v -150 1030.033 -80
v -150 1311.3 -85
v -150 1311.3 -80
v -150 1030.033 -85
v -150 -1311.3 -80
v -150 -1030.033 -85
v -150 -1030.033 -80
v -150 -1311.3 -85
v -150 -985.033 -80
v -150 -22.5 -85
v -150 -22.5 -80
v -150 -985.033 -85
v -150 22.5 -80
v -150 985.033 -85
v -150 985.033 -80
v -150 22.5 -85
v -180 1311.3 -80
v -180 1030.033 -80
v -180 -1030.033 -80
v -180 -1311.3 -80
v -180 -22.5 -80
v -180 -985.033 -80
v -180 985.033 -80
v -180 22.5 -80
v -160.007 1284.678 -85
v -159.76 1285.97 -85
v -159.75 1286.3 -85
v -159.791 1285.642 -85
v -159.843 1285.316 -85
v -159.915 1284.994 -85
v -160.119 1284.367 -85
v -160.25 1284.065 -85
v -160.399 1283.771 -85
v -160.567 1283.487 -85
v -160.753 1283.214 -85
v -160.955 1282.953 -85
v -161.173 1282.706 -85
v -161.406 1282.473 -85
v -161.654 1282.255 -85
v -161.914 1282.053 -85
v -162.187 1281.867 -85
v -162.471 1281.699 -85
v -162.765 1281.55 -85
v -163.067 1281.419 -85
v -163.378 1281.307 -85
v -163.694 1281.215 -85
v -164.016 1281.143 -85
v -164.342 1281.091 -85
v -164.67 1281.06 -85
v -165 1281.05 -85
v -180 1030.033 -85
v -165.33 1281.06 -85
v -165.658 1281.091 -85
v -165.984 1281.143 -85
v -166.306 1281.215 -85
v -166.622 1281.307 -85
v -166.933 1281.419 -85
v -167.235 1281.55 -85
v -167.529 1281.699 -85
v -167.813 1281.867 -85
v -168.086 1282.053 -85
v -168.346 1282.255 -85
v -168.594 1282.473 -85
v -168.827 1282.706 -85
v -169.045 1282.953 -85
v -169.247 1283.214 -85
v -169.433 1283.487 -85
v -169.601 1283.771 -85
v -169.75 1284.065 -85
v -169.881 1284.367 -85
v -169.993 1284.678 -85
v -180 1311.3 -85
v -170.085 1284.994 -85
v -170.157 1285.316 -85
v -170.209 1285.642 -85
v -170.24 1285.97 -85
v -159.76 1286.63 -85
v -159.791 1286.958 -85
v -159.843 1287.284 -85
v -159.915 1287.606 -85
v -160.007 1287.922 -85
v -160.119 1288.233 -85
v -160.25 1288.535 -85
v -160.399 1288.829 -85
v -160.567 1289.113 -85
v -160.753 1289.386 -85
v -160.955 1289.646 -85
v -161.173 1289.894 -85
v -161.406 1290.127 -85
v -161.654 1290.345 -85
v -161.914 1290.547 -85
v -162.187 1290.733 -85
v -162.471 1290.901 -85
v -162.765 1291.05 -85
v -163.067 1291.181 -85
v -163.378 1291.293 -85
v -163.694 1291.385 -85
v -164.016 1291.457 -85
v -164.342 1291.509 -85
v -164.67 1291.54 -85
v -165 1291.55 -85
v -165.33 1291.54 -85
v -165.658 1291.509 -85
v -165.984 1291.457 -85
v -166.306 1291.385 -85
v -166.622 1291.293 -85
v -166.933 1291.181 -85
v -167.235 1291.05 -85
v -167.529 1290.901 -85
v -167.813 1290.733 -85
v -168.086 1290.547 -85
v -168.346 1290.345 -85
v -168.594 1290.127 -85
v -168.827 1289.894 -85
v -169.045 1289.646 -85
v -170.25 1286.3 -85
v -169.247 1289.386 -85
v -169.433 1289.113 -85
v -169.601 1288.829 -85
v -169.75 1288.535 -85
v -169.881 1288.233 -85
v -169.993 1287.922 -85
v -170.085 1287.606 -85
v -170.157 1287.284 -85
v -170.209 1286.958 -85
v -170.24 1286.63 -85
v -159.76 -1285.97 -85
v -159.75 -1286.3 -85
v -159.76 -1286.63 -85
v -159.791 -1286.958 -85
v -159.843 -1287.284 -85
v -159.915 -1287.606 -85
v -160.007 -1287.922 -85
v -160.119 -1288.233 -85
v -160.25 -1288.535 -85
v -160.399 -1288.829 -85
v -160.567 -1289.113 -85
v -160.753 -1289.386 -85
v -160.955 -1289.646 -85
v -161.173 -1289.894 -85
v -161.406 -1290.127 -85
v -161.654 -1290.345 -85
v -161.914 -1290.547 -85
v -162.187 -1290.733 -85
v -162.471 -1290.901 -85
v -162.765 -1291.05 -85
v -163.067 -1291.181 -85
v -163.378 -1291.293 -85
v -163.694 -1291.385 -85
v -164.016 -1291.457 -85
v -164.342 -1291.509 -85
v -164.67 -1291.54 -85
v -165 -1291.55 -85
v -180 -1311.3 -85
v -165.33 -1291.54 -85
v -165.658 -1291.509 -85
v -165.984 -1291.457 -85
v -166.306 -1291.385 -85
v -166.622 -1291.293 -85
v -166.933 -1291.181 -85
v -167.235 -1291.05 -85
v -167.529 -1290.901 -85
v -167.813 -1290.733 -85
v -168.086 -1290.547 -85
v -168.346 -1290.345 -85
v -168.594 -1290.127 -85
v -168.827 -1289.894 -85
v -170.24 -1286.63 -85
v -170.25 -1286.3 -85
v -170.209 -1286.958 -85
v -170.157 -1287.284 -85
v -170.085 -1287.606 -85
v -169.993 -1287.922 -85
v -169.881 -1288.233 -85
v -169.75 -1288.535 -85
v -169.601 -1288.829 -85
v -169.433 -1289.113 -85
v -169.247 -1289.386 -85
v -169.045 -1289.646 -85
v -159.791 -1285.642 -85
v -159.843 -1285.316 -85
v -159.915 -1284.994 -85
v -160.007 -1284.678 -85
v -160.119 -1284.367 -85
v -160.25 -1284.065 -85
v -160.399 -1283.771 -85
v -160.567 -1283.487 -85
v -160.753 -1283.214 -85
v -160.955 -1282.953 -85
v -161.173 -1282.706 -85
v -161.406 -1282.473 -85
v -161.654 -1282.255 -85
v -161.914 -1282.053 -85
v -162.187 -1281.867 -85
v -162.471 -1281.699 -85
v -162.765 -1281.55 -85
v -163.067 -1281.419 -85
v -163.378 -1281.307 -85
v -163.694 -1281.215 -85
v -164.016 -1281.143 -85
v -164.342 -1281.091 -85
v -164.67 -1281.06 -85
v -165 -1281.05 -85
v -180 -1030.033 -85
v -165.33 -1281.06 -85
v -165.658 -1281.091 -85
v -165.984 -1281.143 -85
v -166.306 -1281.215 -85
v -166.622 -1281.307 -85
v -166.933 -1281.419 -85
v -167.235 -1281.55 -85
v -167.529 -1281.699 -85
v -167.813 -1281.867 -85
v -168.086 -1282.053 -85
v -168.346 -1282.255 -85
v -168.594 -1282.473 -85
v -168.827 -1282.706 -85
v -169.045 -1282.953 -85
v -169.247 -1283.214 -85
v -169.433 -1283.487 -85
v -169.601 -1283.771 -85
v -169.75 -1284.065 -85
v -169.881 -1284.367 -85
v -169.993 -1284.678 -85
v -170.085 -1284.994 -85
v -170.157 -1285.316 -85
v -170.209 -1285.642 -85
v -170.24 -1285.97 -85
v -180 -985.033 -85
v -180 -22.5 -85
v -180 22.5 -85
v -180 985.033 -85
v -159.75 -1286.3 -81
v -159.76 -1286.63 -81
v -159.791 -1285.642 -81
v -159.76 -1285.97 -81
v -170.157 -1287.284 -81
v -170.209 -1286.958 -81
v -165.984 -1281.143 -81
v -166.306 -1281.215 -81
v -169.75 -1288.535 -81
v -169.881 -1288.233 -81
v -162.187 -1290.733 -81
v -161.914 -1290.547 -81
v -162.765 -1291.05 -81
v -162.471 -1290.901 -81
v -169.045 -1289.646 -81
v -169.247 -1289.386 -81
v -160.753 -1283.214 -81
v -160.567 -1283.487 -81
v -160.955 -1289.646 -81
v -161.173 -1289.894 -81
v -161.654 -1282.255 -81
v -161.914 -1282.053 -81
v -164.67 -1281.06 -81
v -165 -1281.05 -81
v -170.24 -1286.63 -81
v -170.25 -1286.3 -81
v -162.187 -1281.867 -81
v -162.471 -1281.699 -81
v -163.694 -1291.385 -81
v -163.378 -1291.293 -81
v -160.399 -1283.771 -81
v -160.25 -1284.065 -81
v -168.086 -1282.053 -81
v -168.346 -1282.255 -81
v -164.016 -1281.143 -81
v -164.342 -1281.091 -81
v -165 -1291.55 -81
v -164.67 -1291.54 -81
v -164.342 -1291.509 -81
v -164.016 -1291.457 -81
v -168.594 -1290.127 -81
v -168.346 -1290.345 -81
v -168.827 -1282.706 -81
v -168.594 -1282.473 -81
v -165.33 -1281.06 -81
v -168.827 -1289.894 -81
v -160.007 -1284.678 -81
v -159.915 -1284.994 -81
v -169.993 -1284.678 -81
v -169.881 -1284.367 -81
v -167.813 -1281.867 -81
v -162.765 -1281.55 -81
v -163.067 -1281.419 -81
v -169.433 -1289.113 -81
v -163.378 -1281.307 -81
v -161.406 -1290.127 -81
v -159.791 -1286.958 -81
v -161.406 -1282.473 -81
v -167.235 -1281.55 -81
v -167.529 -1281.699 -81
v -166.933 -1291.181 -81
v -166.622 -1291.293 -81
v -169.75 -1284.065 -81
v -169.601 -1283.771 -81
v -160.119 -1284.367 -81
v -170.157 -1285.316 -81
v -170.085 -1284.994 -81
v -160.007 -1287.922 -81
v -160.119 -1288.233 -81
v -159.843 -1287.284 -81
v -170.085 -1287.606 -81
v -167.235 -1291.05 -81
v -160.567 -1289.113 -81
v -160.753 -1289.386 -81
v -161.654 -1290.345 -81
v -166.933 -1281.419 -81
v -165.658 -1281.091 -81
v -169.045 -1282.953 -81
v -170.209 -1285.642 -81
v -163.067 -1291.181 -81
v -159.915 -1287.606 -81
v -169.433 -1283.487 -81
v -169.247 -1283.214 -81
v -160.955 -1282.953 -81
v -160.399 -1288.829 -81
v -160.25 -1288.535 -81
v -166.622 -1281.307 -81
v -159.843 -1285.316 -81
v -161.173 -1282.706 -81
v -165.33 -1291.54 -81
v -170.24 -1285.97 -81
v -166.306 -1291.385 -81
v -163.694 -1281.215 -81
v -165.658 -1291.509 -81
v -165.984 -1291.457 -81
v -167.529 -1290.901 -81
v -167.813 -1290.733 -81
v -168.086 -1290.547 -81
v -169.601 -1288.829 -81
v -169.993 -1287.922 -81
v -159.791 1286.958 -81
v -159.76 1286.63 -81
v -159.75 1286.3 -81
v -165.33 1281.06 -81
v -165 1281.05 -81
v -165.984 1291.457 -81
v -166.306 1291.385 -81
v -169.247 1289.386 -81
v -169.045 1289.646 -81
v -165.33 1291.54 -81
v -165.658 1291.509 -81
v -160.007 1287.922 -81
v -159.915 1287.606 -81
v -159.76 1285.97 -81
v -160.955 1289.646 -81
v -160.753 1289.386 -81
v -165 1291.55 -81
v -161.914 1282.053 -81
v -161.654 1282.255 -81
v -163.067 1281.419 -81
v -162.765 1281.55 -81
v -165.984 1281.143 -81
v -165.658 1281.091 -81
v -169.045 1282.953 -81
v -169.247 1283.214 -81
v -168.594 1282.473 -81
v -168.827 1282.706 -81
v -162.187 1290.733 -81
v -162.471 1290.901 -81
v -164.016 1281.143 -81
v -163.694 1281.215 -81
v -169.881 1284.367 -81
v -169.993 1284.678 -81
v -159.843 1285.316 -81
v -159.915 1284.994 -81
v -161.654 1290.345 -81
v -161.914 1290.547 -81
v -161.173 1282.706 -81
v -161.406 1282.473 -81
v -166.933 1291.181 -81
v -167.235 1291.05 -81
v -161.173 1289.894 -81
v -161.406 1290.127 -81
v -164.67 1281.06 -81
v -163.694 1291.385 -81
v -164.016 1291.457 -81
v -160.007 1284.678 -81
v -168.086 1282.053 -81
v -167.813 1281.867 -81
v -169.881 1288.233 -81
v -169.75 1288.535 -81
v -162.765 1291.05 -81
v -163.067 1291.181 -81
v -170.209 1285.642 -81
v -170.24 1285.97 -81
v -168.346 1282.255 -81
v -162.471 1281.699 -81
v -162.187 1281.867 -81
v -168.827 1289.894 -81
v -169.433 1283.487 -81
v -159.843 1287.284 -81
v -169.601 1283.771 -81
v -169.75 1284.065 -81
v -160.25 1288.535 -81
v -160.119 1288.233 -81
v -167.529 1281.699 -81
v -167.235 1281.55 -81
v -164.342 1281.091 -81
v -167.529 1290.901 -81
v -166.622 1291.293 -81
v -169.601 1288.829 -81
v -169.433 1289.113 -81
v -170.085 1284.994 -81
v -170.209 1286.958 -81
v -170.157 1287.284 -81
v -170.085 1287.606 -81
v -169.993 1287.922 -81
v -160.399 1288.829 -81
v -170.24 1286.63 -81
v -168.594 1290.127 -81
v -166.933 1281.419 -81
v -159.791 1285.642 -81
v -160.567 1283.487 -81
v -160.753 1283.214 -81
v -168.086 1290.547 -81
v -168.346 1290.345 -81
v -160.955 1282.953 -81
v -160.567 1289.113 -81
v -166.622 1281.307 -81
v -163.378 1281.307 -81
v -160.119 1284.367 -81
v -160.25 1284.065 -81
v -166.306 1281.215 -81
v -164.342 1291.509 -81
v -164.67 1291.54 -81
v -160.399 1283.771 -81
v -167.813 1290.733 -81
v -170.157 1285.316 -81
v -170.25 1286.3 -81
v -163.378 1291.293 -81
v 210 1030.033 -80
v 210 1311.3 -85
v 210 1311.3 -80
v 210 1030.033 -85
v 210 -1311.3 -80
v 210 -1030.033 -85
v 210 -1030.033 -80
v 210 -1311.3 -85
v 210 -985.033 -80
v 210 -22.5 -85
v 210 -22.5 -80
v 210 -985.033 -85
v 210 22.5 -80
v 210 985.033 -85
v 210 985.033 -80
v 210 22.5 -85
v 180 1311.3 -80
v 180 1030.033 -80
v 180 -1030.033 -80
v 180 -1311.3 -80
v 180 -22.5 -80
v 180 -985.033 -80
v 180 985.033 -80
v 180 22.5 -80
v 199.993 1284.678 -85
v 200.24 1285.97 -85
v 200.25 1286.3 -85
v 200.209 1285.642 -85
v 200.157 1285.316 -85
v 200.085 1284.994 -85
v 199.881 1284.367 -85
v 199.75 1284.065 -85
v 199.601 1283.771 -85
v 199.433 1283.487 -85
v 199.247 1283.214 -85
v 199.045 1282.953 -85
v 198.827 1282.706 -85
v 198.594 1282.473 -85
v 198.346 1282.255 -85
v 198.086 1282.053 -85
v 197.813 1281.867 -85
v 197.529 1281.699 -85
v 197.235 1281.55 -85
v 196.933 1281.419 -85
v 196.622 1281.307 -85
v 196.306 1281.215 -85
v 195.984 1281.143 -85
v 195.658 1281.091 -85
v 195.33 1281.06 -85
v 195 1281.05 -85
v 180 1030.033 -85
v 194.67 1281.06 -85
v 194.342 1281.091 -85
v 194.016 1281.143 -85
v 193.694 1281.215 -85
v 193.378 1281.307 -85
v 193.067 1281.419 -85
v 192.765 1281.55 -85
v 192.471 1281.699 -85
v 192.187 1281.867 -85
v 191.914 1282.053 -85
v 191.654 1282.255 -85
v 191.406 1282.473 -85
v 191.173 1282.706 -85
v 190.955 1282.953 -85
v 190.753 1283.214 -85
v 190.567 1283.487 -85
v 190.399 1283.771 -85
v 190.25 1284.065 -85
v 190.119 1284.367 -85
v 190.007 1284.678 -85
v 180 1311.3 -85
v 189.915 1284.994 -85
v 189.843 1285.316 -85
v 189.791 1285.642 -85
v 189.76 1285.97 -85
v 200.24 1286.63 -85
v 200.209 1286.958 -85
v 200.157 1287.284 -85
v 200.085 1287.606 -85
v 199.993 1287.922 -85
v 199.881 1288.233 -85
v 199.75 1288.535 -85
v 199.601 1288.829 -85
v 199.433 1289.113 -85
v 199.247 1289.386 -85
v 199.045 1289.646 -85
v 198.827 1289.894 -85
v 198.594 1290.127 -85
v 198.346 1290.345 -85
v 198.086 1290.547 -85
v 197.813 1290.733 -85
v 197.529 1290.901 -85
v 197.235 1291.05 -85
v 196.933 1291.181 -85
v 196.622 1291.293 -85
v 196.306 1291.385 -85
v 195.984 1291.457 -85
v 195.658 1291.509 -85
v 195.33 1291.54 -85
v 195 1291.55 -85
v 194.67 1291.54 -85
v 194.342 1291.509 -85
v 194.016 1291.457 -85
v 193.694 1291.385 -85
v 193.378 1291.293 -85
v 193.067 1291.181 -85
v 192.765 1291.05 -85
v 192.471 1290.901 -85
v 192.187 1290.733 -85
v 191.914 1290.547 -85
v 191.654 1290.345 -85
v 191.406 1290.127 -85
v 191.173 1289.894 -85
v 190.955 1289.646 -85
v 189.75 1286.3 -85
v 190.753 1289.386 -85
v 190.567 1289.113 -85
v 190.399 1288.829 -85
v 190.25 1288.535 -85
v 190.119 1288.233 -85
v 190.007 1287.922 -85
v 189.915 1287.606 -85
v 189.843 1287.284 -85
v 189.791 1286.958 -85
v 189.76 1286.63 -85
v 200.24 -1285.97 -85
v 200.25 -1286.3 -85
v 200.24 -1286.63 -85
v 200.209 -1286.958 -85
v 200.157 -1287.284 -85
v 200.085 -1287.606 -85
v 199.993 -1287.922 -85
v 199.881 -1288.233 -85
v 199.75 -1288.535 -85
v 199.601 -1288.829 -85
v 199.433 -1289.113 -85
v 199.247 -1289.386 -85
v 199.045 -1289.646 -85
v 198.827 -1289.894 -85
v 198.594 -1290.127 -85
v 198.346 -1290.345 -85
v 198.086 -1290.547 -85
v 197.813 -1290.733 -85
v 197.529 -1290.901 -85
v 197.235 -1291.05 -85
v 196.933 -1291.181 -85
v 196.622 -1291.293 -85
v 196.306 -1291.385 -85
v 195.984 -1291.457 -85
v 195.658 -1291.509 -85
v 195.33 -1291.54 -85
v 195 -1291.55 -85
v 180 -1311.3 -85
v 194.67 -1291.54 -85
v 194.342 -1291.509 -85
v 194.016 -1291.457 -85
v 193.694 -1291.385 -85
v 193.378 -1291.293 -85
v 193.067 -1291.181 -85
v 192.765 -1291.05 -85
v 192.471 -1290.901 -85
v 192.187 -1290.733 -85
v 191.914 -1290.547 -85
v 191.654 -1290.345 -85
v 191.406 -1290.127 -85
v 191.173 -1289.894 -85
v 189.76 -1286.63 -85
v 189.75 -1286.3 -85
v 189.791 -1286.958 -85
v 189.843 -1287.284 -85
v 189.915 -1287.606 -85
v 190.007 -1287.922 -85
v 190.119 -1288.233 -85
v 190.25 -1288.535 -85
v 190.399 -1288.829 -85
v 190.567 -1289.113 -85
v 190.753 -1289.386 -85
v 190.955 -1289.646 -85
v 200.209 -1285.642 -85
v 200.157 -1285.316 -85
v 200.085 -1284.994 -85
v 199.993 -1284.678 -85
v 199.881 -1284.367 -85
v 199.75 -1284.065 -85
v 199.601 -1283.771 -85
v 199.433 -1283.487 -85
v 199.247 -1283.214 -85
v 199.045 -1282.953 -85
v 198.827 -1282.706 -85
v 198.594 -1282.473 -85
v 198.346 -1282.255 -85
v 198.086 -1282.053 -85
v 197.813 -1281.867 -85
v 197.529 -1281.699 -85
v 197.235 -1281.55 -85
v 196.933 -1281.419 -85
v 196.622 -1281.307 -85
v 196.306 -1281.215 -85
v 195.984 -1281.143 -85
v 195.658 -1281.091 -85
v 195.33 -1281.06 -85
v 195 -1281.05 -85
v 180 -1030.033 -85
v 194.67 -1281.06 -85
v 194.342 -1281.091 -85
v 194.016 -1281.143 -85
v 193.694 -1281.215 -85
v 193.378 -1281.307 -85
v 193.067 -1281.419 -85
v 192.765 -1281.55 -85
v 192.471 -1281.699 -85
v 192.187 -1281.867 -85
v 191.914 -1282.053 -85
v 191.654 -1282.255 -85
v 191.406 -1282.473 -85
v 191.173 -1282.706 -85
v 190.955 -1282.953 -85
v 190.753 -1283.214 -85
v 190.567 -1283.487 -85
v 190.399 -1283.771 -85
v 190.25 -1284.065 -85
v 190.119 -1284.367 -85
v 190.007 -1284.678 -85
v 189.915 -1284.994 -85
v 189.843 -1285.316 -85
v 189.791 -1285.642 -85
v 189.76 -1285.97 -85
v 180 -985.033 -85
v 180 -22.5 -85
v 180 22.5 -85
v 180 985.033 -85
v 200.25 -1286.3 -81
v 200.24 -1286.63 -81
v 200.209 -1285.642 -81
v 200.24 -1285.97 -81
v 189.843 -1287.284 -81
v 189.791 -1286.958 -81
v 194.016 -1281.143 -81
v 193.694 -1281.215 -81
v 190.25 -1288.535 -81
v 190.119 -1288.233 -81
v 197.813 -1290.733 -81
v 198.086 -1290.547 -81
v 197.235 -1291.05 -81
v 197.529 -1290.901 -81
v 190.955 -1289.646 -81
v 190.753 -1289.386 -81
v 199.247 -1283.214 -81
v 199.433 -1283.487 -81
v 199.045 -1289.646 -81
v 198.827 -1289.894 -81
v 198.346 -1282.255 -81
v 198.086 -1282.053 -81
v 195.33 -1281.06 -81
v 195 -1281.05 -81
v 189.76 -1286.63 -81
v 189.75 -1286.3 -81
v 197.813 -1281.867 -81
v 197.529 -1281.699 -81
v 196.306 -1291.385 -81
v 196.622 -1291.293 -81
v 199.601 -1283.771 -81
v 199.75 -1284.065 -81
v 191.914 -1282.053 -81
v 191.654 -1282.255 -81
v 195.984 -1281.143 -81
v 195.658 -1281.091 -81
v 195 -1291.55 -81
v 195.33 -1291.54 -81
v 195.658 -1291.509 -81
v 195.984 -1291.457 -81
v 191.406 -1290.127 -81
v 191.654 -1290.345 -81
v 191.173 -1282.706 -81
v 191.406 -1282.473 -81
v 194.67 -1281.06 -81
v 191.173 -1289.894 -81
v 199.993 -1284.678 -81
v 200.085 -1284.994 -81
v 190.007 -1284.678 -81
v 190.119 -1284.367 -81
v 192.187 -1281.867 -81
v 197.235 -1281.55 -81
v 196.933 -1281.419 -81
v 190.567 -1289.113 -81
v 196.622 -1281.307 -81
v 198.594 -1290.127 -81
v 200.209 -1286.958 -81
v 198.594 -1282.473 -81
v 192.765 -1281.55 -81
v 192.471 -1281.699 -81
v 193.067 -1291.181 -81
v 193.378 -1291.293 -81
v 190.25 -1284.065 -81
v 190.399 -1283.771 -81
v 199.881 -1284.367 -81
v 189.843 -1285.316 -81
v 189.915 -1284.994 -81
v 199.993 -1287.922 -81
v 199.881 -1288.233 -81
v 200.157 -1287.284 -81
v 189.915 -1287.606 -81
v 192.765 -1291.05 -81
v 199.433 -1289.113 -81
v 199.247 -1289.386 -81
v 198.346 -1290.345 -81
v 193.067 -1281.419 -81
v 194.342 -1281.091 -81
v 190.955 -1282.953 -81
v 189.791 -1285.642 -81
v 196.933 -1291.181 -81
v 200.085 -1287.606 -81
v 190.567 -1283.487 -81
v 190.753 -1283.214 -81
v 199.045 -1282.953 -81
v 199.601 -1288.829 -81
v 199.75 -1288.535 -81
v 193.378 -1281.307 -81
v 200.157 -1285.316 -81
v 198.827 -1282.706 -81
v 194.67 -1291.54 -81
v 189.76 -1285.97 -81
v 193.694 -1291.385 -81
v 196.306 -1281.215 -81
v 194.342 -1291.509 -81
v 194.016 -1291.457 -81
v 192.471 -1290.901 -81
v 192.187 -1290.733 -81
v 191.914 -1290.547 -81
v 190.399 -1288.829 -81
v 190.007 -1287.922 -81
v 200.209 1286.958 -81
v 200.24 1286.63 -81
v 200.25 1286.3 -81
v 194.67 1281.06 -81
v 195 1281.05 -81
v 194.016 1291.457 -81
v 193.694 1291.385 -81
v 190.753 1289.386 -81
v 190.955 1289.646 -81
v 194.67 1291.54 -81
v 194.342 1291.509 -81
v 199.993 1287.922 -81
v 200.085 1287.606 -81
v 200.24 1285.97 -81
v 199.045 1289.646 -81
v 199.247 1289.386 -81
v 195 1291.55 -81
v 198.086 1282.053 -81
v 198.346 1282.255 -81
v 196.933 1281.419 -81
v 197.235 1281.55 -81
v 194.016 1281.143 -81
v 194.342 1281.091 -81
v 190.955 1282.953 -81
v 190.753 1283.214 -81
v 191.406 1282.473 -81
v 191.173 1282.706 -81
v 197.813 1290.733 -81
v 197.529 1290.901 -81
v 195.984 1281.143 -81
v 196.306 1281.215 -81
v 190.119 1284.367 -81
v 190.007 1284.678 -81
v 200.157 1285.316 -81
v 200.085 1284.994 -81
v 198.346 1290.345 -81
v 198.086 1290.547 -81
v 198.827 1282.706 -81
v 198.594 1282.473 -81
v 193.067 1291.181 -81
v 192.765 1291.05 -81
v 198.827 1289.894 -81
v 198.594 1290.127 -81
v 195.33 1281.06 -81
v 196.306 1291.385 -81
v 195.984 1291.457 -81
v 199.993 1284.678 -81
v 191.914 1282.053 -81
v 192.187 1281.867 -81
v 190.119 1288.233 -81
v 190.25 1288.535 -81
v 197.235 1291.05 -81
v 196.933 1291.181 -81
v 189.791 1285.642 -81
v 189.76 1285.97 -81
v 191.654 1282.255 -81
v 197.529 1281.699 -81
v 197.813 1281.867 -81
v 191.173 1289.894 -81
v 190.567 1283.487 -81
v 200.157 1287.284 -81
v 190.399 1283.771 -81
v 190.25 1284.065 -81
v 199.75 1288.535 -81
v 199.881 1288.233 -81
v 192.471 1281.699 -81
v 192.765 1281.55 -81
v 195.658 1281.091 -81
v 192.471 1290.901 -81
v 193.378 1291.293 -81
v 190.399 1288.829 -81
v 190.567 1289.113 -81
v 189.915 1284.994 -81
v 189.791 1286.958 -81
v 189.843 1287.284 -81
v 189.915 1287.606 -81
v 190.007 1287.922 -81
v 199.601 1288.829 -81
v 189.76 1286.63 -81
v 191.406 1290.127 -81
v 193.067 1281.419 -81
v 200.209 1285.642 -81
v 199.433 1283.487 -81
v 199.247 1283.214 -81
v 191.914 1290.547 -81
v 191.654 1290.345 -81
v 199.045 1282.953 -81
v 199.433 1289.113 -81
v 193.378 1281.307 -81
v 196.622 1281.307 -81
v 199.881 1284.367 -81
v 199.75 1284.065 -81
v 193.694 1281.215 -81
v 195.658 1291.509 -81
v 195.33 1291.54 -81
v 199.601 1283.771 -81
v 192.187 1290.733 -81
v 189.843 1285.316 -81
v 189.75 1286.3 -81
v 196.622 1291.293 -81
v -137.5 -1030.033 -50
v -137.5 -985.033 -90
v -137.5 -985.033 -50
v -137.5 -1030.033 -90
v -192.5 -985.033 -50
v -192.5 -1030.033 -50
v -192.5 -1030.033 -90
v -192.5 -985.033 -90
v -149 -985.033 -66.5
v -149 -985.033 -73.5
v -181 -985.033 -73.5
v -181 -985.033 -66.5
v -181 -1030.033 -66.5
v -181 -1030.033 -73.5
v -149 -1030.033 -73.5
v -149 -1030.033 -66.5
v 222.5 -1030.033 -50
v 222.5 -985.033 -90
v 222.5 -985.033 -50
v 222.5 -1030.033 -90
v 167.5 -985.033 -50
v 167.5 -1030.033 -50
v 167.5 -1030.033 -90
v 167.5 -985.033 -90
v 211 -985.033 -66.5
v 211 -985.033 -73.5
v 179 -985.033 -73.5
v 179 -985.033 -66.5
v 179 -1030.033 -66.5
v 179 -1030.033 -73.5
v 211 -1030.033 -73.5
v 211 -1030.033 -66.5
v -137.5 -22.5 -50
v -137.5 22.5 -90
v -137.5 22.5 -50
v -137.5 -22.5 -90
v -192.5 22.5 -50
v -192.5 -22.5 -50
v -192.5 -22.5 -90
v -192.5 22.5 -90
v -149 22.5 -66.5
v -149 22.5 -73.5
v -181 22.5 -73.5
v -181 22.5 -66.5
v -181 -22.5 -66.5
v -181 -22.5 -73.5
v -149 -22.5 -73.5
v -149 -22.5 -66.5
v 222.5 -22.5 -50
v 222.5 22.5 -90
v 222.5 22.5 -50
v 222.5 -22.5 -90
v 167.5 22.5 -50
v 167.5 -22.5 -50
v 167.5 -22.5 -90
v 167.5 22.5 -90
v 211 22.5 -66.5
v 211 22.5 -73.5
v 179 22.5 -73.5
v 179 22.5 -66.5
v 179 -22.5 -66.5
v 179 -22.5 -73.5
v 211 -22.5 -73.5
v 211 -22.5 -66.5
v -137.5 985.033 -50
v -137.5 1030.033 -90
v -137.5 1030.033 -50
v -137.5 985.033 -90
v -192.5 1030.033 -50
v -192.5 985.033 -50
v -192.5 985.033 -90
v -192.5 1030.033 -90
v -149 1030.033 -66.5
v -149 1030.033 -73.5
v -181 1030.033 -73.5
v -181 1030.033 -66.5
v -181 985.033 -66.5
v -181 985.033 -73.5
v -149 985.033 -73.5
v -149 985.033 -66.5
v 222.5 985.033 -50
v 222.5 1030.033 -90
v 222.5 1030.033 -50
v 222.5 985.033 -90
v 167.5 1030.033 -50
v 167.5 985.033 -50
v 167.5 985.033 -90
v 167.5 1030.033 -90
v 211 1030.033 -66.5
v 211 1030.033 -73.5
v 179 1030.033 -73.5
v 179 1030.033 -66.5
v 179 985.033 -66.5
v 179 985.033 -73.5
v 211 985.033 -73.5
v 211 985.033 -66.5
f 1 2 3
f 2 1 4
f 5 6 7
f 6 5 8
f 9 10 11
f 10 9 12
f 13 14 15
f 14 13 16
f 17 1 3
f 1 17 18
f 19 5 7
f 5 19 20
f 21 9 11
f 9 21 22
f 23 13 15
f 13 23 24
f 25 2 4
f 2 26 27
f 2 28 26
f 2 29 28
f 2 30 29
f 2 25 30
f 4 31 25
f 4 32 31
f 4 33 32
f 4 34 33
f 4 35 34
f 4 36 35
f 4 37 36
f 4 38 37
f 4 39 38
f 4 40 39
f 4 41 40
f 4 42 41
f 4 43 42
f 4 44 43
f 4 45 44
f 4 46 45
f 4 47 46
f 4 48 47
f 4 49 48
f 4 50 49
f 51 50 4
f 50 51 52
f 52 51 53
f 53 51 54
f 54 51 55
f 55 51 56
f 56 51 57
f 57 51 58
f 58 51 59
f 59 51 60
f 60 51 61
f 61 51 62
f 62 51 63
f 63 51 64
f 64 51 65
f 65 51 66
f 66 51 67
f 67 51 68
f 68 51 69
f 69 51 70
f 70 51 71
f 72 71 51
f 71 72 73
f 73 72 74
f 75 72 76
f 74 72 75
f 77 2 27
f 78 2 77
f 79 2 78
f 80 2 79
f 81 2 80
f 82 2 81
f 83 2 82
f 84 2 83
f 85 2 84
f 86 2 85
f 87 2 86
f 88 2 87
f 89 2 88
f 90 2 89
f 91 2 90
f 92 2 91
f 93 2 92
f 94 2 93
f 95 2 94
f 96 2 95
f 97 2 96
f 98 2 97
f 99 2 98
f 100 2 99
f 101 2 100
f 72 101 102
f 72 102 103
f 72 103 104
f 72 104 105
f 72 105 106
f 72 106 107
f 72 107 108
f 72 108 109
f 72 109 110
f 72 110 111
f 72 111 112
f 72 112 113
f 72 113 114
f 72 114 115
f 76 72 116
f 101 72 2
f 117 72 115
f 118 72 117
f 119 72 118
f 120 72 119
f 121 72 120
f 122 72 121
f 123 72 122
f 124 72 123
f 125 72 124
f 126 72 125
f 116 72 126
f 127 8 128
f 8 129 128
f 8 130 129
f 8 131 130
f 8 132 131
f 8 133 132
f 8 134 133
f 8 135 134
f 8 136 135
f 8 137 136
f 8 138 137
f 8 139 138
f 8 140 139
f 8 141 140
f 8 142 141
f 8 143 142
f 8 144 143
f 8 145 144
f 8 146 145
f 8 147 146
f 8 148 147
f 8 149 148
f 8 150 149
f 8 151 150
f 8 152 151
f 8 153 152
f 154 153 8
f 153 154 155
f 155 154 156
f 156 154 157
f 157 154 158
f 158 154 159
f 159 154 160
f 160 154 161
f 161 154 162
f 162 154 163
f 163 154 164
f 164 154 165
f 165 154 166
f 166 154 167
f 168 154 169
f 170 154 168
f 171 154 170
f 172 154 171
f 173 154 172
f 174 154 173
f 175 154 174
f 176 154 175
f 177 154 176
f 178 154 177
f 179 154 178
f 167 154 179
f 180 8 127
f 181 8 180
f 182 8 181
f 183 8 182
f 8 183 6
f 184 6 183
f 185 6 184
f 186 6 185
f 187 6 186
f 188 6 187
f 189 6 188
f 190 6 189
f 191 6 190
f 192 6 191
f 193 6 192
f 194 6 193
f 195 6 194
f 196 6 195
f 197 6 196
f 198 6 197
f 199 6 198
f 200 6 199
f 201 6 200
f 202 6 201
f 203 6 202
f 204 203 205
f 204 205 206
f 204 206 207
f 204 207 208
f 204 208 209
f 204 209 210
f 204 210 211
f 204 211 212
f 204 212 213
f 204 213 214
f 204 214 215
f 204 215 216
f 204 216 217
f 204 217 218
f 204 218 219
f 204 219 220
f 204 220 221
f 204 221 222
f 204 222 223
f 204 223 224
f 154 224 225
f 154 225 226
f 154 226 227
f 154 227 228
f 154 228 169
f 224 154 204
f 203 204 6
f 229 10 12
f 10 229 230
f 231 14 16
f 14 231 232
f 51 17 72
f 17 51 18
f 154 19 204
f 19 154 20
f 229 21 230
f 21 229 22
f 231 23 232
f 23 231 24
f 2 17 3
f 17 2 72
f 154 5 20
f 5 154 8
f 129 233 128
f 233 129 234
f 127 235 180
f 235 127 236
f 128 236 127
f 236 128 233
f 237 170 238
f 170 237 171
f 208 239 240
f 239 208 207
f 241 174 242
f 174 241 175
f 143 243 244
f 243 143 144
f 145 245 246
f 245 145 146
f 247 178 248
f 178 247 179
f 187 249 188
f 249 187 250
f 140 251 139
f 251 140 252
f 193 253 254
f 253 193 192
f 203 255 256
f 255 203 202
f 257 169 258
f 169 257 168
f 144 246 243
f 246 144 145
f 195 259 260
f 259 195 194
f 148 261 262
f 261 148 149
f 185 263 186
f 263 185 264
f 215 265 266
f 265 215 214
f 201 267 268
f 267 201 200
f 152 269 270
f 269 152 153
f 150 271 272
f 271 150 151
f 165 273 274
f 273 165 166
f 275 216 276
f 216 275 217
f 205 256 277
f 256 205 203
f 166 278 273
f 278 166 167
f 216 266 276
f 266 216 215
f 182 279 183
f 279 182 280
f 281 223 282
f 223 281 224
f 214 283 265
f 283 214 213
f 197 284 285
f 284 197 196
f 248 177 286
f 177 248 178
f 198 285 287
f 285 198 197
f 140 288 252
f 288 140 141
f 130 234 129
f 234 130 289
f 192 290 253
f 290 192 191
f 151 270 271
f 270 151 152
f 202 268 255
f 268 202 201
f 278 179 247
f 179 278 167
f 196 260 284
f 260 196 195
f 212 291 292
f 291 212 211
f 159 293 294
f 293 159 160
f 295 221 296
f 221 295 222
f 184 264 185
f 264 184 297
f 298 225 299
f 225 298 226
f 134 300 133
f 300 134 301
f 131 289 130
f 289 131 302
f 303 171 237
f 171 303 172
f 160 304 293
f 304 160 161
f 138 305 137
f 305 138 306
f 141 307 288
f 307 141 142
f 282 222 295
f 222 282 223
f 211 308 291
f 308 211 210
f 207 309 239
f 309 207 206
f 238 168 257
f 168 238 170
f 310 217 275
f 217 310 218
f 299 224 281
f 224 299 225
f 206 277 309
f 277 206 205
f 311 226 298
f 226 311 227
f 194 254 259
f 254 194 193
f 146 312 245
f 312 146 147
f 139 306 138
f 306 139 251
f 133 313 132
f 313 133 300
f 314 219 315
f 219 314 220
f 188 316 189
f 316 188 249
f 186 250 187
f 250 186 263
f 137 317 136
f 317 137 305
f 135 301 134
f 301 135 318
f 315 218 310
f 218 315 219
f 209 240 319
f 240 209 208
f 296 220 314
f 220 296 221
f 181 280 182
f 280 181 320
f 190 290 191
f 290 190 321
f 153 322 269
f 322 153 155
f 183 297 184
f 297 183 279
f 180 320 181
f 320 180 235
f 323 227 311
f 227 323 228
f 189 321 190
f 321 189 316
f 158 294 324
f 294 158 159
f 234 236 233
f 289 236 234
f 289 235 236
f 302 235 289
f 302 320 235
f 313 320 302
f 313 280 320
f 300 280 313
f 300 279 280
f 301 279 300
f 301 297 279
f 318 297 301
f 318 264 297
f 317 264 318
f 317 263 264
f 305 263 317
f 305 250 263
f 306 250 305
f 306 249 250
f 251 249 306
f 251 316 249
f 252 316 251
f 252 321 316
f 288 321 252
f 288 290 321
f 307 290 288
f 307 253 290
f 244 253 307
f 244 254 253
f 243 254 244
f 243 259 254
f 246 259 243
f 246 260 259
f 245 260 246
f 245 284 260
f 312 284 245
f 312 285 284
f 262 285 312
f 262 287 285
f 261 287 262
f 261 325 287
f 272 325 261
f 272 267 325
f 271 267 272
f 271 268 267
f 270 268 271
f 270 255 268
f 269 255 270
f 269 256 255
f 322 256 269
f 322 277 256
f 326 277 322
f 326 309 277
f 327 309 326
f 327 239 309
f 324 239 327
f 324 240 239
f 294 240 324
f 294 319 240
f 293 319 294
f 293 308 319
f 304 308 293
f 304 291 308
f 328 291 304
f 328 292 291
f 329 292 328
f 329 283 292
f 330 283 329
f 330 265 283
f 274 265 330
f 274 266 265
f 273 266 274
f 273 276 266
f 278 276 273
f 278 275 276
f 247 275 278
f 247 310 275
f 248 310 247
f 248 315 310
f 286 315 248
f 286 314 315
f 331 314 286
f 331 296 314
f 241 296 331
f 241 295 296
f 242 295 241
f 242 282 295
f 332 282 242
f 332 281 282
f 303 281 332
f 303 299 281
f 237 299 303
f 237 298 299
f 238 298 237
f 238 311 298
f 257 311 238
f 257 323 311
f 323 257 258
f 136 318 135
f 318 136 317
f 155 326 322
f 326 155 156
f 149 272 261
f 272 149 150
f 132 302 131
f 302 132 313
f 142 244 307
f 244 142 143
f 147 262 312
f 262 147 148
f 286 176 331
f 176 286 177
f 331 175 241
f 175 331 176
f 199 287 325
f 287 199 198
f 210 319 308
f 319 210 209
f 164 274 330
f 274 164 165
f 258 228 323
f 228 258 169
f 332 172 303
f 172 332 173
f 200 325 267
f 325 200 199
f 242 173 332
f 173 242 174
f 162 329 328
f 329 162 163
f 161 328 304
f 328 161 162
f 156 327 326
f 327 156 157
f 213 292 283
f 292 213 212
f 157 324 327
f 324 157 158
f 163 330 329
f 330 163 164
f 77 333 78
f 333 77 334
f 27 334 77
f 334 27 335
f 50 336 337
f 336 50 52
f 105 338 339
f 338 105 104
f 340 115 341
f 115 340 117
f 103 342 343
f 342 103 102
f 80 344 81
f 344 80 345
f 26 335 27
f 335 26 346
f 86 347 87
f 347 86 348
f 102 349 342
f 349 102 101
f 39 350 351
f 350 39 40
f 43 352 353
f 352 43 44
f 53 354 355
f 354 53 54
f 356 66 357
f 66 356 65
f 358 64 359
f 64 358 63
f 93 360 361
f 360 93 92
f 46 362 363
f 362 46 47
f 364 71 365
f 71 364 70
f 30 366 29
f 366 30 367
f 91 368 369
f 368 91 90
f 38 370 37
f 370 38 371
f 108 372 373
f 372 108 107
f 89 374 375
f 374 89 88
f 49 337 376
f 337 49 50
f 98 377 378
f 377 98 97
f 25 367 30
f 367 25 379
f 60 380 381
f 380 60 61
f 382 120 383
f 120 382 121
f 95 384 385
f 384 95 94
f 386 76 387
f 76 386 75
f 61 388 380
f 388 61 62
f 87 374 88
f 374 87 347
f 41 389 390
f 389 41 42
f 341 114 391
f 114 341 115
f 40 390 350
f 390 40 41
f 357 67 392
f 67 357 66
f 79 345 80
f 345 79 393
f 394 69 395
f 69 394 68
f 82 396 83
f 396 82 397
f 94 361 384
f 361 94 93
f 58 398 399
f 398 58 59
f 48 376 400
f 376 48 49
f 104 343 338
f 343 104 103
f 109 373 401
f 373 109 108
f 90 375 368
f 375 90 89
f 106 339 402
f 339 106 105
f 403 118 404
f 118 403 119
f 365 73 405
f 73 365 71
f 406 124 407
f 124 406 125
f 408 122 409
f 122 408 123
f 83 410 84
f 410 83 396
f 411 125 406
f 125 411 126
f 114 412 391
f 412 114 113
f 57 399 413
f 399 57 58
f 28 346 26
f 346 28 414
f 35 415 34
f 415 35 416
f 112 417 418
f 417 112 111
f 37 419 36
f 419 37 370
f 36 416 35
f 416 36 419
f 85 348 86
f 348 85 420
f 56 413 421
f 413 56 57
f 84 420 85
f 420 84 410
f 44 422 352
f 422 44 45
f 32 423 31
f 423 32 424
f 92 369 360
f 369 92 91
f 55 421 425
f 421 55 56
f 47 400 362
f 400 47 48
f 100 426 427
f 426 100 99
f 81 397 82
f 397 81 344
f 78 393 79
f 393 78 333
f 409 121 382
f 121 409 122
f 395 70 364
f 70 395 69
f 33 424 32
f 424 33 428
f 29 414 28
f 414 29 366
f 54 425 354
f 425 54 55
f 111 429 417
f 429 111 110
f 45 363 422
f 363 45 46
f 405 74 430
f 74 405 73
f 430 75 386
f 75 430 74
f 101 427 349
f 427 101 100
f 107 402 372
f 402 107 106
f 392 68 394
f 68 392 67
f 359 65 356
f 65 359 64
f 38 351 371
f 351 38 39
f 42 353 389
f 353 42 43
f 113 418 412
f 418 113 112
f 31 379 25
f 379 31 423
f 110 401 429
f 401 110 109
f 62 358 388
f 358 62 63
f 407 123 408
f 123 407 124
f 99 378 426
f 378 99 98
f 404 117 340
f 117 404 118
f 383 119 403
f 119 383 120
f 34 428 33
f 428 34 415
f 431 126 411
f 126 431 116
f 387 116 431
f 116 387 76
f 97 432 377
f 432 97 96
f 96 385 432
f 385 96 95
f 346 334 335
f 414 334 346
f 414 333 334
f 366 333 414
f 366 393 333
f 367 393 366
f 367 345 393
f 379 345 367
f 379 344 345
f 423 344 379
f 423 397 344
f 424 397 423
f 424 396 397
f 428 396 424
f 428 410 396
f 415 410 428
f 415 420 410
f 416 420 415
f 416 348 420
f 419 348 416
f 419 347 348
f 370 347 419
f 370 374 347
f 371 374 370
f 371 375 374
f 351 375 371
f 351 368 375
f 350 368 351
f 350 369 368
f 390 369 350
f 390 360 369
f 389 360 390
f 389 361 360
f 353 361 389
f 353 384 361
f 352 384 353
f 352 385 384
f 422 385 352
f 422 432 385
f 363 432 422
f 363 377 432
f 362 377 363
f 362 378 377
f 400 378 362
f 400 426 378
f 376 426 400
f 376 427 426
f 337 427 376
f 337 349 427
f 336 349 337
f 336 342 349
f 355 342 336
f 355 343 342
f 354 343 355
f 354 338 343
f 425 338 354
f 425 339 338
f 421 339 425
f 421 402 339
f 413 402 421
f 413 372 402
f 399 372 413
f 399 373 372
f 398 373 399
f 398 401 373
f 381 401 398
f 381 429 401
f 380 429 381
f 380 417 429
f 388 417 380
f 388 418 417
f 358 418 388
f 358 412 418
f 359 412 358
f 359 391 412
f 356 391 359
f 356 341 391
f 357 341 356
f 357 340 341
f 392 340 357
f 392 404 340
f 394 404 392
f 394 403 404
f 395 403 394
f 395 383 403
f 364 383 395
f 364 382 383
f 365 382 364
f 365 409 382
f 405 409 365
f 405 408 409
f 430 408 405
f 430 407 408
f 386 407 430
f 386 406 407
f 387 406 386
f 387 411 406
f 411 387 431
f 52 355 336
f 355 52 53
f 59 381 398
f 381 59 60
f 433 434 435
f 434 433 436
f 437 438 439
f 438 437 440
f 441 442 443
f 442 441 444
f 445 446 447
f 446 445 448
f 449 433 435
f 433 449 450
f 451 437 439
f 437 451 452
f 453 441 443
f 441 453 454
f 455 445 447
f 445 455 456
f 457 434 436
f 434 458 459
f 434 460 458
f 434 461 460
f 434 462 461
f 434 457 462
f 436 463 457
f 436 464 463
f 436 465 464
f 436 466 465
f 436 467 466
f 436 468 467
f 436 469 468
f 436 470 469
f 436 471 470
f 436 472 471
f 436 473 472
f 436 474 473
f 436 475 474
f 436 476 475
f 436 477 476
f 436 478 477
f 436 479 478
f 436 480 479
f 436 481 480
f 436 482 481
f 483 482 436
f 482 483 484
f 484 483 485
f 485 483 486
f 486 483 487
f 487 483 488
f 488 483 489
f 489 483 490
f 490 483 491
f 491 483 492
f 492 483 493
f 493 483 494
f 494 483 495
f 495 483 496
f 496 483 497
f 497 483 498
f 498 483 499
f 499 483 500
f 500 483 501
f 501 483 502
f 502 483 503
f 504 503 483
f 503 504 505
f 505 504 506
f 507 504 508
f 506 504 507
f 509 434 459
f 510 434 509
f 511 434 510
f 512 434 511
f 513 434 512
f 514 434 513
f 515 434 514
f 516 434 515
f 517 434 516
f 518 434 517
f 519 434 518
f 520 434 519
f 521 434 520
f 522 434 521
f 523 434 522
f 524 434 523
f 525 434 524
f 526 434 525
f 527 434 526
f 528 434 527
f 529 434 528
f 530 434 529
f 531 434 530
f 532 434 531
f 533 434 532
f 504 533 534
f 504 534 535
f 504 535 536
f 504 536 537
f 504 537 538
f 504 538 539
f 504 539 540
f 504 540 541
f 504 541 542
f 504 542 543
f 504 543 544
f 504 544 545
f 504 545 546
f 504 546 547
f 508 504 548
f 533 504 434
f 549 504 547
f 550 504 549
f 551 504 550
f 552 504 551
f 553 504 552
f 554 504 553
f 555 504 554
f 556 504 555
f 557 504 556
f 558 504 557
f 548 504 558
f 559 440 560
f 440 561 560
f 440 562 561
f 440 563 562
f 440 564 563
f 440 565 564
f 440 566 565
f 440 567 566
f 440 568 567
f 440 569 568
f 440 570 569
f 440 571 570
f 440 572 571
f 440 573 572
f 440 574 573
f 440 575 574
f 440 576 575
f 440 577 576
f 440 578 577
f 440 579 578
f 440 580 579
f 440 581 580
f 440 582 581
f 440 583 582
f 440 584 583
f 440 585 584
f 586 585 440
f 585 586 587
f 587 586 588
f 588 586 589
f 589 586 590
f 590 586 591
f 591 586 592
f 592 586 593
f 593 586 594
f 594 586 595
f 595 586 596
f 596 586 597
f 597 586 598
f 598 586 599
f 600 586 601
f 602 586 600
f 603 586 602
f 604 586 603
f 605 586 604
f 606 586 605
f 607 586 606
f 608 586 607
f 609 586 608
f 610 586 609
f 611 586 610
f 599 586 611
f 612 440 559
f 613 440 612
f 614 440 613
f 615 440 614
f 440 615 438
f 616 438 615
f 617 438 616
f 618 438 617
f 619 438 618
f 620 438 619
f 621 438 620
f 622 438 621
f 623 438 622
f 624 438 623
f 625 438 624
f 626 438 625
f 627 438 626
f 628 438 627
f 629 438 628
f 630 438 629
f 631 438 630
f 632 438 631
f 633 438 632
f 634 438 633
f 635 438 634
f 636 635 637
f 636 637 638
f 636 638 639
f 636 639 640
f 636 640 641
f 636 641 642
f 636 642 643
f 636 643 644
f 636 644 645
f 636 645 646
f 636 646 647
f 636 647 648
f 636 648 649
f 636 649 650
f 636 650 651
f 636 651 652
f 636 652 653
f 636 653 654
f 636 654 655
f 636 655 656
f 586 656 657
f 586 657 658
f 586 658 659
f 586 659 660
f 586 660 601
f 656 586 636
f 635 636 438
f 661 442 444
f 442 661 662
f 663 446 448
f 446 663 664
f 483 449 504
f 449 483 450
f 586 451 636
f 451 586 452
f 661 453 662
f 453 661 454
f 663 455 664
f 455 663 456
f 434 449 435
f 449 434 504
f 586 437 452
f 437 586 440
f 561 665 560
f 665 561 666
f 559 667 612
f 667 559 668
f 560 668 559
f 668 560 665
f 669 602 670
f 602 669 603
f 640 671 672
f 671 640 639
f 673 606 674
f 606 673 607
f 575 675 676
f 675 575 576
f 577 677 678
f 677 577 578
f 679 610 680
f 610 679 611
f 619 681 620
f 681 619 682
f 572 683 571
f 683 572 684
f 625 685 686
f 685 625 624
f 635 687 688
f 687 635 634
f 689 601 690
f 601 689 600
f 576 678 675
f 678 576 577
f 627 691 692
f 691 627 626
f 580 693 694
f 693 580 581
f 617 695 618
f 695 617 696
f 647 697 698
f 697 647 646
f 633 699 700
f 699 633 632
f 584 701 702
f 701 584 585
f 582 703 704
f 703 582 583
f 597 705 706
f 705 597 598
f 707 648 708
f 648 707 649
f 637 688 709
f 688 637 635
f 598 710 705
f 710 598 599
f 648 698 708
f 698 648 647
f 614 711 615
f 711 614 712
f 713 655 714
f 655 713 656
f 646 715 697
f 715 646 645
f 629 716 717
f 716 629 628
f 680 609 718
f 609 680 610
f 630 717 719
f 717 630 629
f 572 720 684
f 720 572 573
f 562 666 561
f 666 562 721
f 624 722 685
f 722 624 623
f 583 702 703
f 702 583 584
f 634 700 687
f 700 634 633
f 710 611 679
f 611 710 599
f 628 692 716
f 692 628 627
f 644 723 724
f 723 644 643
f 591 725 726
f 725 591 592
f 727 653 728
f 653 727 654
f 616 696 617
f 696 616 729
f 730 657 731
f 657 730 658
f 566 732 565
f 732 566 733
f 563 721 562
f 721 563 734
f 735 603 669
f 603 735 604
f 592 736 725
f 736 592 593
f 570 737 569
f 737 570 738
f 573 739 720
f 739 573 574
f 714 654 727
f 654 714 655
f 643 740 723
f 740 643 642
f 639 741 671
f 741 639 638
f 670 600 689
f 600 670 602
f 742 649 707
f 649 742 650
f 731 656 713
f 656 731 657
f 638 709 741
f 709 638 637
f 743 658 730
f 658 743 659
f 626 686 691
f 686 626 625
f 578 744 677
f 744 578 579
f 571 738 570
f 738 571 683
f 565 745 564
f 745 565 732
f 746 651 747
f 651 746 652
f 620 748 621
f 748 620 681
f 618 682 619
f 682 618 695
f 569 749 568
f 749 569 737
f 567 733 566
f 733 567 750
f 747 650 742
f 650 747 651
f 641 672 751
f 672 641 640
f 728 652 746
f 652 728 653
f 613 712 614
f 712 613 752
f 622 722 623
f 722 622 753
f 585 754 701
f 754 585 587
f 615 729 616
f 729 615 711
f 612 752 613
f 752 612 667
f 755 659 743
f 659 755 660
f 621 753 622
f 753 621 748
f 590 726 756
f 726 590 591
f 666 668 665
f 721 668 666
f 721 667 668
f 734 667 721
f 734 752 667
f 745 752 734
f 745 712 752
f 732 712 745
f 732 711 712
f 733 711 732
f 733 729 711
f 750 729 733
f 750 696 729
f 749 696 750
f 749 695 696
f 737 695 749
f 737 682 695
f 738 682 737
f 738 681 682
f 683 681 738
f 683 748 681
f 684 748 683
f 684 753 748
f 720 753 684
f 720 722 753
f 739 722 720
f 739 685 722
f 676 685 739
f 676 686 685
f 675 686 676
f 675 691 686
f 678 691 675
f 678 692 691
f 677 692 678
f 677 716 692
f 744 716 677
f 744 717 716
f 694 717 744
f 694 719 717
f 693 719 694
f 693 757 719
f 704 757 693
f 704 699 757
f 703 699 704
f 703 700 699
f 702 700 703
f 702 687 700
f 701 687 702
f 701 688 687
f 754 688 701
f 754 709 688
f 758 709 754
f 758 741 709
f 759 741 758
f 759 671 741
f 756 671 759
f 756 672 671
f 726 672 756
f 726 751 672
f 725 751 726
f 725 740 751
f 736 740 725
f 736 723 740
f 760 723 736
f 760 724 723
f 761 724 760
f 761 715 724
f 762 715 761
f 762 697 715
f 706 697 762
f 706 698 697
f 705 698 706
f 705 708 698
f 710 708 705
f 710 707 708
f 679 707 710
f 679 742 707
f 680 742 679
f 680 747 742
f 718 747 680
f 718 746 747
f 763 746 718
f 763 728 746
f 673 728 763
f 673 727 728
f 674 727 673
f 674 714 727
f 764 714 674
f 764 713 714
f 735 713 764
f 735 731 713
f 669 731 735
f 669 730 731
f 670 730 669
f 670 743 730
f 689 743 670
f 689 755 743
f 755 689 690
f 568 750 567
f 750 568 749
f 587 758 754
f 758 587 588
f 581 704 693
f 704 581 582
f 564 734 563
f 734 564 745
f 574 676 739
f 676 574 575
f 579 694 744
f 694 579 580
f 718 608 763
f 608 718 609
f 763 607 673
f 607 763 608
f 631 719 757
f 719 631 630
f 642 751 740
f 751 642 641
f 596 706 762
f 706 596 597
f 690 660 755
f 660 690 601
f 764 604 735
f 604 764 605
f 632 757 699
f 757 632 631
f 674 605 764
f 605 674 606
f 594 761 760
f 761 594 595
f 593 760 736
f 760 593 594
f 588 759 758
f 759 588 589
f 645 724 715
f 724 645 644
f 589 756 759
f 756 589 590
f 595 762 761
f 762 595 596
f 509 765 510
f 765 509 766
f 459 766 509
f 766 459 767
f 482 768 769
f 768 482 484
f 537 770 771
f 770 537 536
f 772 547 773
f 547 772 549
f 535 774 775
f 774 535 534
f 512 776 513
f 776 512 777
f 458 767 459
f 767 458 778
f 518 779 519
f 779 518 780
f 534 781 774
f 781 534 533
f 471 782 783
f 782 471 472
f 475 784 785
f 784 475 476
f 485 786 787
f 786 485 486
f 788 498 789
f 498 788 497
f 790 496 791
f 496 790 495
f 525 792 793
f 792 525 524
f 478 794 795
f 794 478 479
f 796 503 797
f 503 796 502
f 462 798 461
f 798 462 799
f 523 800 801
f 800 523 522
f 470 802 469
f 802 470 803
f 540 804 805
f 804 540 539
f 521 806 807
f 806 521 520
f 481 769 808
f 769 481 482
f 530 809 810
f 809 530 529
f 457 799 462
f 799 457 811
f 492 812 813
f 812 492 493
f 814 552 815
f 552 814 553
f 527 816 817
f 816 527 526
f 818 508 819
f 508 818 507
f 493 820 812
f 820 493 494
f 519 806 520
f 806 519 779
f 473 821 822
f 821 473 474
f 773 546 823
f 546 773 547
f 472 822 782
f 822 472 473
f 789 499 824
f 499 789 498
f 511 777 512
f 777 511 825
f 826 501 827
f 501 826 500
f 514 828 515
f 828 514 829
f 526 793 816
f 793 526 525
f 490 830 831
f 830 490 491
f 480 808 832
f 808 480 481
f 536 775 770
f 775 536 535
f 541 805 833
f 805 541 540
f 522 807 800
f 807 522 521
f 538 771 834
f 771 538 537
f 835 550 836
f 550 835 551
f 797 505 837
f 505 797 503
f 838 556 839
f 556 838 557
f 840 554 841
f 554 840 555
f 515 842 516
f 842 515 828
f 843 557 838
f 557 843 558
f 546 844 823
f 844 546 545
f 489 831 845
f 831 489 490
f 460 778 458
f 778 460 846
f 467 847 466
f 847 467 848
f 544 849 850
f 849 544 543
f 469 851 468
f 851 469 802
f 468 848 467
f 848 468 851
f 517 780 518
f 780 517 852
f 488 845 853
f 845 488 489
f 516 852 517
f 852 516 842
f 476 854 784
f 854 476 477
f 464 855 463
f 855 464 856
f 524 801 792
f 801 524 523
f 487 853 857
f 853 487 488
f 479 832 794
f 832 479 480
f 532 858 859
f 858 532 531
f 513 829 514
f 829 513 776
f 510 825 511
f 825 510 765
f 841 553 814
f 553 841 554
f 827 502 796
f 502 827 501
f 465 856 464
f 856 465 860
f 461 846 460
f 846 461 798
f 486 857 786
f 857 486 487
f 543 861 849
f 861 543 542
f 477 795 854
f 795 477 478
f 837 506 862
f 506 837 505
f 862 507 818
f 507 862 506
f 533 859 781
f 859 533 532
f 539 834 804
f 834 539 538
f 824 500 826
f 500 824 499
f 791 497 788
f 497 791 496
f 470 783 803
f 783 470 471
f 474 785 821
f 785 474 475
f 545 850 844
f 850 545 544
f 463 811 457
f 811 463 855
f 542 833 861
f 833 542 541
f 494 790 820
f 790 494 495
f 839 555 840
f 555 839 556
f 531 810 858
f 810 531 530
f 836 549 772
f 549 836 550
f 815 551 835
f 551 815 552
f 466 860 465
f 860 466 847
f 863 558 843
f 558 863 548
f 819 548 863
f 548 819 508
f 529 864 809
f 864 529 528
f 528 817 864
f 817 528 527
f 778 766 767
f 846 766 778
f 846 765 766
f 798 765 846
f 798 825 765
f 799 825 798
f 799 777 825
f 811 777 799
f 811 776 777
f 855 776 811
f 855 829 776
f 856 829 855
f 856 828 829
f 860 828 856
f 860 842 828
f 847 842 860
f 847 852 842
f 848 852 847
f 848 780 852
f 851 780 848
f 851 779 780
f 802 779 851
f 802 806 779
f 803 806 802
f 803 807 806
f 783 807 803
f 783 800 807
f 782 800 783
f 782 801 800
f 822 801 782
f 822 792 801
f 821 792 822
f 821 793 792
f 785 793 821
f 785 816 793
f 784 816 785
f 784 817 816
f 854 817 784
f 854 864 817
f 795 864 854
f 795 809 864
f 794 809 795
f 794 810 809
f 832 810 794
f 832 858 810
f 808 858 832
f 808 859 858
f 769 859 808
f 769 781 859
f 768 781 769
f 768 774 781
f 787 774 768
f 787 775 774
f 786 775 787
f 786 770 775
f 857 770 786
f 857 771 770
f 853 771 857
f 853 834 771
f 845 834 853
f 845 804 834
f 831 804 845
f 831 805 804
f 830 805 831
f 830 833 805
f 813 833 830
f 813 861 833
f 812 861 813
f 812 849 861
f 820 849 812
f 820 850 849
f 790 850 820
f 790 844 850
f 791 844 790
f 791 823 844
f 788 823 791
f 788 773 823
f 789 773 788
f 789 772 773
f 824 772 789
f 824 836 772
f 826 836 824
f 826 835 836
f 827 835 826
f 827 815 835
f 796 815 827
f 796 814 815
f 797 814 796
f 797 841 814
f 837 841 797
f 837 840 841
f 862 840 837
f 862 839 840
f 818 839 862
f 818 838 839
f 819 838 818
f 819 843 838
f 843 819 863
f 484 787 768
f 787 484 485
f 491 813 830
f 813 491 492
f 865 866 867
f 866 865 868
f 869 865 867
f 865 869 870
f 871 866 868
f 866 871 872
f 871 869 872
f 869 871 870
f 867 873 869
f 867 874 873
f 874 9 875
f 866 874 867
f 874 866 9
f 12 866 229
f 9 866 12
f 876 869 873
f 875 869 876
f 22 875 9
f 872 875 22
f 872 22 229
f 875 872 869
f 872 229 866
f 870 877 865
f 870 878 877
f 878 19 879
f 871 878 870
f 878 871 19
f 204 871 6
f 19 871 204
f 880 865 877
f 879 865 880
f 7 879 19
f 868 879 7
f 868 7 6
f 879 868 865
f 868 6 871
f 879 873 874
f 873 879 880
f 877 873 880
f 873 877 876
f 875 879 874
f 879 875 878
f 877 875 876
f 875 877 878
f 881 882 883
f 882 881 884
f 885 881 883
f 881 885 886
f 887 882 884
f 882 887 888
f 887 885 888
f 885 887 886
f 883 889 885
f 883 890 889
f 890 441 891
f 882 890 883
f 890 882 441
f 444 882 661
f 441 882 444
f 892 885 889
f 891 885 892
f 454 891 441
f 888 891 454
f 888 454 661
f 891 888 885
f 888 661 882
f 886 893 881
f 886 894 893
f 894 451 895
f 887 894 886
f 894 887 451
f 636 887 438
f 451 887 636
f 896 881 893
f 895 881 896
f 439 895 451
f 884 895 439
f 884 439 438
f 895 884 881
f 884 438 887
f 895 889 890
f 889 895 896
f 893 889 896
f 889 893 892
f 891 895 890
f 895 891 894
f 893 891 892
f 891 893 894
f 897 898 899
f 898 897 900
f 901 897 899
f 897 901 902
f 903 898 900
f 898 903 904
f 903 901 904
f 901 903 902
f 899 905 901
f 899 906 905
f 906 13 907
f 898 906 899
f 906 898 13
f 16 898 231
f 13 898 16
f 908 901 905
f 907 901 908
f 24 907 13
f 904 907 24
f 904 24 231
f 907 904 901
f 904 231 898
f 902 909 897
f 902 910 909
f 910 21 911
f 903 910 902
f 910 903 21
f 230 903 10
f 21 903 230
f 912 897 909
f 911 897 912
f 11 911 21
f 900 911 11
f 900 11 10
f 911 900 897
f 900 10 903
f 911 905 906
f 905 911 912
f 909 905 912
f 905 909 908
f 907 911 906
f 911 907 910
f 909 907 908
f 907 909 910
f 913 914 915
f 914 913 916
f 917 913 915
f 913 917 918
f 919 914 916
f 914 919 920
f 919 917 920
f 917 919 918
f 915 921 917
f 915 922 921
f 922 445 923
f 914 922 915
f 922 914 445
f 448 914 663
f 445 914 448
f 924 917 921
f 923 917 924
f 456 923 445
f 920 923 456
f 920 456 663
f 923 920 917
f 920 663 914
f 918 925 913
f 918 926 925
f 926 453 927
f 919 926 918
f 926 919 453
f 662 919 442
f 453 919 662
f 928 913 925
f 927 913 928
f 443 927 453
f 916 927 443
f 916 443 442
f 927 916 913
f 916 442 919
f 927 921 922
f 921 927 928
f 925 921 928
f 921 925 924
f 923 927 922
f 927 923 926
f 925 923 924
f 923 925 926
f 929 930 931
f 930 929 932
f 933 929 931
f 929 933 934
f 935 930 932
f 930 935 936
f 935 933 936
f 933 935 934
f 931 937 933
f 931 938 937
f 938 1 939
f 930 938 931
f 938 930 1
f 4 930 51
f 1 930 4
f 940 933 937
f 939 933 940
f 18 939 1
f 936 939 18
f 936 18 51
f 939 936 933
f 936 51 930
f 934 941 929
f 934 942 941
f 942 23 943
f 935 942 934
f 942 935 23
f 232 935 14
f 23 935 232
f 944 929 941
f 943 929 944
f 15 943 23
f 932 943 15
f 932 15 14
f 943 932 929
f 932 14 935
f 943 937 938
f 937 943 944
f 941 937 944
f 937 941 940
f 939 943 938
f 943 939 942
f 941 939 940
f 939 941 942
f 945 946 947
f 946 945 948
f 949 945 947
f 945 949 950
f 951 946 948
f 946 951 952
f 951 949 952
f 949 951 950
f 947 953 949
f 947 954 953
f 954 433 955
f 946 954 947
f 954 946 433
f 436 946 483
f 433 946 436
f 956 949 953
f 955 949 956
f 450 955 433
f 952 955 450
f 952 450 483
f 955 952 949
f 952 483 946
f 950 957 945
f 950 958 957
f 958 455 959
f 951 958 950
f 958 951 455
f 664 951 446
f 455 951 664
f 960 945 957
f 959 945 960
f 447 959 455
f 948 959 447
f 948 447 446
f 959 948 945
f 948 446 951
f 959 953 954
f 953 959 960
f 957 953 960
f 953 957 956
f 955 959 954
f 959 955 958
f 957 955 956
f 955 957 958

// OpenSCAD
// ====================================================================================
// REVOLUTIONARY TECHNOLOGY COMPANY & UNIVERSITY OF WASHINGTON DEPARTMENT OF PHYSICS
// Subsystem: impala_ss_busbars.scad (Sedan Solid Copper Power Distribution Grid)
// Core Application: Rigid Shielded 800V DC Traction Paths Configured for 1,350 Nm Motor
// Compliance: Rule #1 (Thick 3oz Equivalent Solid Copper Bus Structures)
// Center Origin (0,0,0) = Front Firewall Pass-Through Terminal Axis Face
// ====================================================================================

$fn = 100; // Mandrel extrusion and CNC milling resolution depth finish

// --- High-Voltage Structural Parameters (mm) ---
inch_to_mm         = 25.4;
impala_wheelbase   = 119.0 * inch_to_mm; // Exactly 3022.60 mm continuous length [0.11]
busbar_thickness   = 5.00;               // 5mm heavy-gauge copper bar profile
busbar_width       = 30.00;              // 30mm width handling ultra-high launch current
conduit_shield_d   = 45.00;              // Orange high-voltage protective sleeve insulation

module solid_traction_busbars() {
    echo("EXTRUDING SOLID RULE #1 HIGH-CURRENT 800V DC COPPER PROPULSION BUSBARS");
    // Slipped along the inner channel profiles of the space frame rails
    color("Orange") { // High-visibility orange warning wrap shield insulation
        for (side = [-1, 1]) {
            translate([side * 180, -impala_wheelbase/2 + 200, -85])
                difference() {
                    // Solid copper power bus bar block element
                    cube([busbar_width, impala_wheelbase - 400, busbar_thickness]);
                    
                    // Bolt eyelet holes connecting to the main pyro-fuse disconnect lugs
                    translate([busbar_width/2, 25, -1]) cylinder(d=10.5, h=10, center=true);
                    translate([busbar_width/2, impala_wheelbase - 425, -1]) cylinder(d=10.5, h=10, center=true);
                }
        }
    }
}

module ceramic_isolation_brackets() {
    // Heavy structural ceramic standoffs locking the busbars to prevent layout short-circuits
    color("White") {
        for (y = [-impala_wheelbase/3, 0, impala_wheelbase/3]) {
            for (side = [-1, 1]) {
                translate([side * 180 + busbar_width/2, y, -70])
                    difference() {
                        cube([55, 45, 40], center=true);
                        // Pass-through slot clearing the rigid copper rail thickness
                        cube([busbar_width + 2, 47, busbar_thickness + 2], center=true);
                    }
            }
        }
    }
}

// --- Composite High-Voltage Busbar Instantiation ---
union() {
    solid_traction_busbars();
    ceramic_isolation_brackets();
}
